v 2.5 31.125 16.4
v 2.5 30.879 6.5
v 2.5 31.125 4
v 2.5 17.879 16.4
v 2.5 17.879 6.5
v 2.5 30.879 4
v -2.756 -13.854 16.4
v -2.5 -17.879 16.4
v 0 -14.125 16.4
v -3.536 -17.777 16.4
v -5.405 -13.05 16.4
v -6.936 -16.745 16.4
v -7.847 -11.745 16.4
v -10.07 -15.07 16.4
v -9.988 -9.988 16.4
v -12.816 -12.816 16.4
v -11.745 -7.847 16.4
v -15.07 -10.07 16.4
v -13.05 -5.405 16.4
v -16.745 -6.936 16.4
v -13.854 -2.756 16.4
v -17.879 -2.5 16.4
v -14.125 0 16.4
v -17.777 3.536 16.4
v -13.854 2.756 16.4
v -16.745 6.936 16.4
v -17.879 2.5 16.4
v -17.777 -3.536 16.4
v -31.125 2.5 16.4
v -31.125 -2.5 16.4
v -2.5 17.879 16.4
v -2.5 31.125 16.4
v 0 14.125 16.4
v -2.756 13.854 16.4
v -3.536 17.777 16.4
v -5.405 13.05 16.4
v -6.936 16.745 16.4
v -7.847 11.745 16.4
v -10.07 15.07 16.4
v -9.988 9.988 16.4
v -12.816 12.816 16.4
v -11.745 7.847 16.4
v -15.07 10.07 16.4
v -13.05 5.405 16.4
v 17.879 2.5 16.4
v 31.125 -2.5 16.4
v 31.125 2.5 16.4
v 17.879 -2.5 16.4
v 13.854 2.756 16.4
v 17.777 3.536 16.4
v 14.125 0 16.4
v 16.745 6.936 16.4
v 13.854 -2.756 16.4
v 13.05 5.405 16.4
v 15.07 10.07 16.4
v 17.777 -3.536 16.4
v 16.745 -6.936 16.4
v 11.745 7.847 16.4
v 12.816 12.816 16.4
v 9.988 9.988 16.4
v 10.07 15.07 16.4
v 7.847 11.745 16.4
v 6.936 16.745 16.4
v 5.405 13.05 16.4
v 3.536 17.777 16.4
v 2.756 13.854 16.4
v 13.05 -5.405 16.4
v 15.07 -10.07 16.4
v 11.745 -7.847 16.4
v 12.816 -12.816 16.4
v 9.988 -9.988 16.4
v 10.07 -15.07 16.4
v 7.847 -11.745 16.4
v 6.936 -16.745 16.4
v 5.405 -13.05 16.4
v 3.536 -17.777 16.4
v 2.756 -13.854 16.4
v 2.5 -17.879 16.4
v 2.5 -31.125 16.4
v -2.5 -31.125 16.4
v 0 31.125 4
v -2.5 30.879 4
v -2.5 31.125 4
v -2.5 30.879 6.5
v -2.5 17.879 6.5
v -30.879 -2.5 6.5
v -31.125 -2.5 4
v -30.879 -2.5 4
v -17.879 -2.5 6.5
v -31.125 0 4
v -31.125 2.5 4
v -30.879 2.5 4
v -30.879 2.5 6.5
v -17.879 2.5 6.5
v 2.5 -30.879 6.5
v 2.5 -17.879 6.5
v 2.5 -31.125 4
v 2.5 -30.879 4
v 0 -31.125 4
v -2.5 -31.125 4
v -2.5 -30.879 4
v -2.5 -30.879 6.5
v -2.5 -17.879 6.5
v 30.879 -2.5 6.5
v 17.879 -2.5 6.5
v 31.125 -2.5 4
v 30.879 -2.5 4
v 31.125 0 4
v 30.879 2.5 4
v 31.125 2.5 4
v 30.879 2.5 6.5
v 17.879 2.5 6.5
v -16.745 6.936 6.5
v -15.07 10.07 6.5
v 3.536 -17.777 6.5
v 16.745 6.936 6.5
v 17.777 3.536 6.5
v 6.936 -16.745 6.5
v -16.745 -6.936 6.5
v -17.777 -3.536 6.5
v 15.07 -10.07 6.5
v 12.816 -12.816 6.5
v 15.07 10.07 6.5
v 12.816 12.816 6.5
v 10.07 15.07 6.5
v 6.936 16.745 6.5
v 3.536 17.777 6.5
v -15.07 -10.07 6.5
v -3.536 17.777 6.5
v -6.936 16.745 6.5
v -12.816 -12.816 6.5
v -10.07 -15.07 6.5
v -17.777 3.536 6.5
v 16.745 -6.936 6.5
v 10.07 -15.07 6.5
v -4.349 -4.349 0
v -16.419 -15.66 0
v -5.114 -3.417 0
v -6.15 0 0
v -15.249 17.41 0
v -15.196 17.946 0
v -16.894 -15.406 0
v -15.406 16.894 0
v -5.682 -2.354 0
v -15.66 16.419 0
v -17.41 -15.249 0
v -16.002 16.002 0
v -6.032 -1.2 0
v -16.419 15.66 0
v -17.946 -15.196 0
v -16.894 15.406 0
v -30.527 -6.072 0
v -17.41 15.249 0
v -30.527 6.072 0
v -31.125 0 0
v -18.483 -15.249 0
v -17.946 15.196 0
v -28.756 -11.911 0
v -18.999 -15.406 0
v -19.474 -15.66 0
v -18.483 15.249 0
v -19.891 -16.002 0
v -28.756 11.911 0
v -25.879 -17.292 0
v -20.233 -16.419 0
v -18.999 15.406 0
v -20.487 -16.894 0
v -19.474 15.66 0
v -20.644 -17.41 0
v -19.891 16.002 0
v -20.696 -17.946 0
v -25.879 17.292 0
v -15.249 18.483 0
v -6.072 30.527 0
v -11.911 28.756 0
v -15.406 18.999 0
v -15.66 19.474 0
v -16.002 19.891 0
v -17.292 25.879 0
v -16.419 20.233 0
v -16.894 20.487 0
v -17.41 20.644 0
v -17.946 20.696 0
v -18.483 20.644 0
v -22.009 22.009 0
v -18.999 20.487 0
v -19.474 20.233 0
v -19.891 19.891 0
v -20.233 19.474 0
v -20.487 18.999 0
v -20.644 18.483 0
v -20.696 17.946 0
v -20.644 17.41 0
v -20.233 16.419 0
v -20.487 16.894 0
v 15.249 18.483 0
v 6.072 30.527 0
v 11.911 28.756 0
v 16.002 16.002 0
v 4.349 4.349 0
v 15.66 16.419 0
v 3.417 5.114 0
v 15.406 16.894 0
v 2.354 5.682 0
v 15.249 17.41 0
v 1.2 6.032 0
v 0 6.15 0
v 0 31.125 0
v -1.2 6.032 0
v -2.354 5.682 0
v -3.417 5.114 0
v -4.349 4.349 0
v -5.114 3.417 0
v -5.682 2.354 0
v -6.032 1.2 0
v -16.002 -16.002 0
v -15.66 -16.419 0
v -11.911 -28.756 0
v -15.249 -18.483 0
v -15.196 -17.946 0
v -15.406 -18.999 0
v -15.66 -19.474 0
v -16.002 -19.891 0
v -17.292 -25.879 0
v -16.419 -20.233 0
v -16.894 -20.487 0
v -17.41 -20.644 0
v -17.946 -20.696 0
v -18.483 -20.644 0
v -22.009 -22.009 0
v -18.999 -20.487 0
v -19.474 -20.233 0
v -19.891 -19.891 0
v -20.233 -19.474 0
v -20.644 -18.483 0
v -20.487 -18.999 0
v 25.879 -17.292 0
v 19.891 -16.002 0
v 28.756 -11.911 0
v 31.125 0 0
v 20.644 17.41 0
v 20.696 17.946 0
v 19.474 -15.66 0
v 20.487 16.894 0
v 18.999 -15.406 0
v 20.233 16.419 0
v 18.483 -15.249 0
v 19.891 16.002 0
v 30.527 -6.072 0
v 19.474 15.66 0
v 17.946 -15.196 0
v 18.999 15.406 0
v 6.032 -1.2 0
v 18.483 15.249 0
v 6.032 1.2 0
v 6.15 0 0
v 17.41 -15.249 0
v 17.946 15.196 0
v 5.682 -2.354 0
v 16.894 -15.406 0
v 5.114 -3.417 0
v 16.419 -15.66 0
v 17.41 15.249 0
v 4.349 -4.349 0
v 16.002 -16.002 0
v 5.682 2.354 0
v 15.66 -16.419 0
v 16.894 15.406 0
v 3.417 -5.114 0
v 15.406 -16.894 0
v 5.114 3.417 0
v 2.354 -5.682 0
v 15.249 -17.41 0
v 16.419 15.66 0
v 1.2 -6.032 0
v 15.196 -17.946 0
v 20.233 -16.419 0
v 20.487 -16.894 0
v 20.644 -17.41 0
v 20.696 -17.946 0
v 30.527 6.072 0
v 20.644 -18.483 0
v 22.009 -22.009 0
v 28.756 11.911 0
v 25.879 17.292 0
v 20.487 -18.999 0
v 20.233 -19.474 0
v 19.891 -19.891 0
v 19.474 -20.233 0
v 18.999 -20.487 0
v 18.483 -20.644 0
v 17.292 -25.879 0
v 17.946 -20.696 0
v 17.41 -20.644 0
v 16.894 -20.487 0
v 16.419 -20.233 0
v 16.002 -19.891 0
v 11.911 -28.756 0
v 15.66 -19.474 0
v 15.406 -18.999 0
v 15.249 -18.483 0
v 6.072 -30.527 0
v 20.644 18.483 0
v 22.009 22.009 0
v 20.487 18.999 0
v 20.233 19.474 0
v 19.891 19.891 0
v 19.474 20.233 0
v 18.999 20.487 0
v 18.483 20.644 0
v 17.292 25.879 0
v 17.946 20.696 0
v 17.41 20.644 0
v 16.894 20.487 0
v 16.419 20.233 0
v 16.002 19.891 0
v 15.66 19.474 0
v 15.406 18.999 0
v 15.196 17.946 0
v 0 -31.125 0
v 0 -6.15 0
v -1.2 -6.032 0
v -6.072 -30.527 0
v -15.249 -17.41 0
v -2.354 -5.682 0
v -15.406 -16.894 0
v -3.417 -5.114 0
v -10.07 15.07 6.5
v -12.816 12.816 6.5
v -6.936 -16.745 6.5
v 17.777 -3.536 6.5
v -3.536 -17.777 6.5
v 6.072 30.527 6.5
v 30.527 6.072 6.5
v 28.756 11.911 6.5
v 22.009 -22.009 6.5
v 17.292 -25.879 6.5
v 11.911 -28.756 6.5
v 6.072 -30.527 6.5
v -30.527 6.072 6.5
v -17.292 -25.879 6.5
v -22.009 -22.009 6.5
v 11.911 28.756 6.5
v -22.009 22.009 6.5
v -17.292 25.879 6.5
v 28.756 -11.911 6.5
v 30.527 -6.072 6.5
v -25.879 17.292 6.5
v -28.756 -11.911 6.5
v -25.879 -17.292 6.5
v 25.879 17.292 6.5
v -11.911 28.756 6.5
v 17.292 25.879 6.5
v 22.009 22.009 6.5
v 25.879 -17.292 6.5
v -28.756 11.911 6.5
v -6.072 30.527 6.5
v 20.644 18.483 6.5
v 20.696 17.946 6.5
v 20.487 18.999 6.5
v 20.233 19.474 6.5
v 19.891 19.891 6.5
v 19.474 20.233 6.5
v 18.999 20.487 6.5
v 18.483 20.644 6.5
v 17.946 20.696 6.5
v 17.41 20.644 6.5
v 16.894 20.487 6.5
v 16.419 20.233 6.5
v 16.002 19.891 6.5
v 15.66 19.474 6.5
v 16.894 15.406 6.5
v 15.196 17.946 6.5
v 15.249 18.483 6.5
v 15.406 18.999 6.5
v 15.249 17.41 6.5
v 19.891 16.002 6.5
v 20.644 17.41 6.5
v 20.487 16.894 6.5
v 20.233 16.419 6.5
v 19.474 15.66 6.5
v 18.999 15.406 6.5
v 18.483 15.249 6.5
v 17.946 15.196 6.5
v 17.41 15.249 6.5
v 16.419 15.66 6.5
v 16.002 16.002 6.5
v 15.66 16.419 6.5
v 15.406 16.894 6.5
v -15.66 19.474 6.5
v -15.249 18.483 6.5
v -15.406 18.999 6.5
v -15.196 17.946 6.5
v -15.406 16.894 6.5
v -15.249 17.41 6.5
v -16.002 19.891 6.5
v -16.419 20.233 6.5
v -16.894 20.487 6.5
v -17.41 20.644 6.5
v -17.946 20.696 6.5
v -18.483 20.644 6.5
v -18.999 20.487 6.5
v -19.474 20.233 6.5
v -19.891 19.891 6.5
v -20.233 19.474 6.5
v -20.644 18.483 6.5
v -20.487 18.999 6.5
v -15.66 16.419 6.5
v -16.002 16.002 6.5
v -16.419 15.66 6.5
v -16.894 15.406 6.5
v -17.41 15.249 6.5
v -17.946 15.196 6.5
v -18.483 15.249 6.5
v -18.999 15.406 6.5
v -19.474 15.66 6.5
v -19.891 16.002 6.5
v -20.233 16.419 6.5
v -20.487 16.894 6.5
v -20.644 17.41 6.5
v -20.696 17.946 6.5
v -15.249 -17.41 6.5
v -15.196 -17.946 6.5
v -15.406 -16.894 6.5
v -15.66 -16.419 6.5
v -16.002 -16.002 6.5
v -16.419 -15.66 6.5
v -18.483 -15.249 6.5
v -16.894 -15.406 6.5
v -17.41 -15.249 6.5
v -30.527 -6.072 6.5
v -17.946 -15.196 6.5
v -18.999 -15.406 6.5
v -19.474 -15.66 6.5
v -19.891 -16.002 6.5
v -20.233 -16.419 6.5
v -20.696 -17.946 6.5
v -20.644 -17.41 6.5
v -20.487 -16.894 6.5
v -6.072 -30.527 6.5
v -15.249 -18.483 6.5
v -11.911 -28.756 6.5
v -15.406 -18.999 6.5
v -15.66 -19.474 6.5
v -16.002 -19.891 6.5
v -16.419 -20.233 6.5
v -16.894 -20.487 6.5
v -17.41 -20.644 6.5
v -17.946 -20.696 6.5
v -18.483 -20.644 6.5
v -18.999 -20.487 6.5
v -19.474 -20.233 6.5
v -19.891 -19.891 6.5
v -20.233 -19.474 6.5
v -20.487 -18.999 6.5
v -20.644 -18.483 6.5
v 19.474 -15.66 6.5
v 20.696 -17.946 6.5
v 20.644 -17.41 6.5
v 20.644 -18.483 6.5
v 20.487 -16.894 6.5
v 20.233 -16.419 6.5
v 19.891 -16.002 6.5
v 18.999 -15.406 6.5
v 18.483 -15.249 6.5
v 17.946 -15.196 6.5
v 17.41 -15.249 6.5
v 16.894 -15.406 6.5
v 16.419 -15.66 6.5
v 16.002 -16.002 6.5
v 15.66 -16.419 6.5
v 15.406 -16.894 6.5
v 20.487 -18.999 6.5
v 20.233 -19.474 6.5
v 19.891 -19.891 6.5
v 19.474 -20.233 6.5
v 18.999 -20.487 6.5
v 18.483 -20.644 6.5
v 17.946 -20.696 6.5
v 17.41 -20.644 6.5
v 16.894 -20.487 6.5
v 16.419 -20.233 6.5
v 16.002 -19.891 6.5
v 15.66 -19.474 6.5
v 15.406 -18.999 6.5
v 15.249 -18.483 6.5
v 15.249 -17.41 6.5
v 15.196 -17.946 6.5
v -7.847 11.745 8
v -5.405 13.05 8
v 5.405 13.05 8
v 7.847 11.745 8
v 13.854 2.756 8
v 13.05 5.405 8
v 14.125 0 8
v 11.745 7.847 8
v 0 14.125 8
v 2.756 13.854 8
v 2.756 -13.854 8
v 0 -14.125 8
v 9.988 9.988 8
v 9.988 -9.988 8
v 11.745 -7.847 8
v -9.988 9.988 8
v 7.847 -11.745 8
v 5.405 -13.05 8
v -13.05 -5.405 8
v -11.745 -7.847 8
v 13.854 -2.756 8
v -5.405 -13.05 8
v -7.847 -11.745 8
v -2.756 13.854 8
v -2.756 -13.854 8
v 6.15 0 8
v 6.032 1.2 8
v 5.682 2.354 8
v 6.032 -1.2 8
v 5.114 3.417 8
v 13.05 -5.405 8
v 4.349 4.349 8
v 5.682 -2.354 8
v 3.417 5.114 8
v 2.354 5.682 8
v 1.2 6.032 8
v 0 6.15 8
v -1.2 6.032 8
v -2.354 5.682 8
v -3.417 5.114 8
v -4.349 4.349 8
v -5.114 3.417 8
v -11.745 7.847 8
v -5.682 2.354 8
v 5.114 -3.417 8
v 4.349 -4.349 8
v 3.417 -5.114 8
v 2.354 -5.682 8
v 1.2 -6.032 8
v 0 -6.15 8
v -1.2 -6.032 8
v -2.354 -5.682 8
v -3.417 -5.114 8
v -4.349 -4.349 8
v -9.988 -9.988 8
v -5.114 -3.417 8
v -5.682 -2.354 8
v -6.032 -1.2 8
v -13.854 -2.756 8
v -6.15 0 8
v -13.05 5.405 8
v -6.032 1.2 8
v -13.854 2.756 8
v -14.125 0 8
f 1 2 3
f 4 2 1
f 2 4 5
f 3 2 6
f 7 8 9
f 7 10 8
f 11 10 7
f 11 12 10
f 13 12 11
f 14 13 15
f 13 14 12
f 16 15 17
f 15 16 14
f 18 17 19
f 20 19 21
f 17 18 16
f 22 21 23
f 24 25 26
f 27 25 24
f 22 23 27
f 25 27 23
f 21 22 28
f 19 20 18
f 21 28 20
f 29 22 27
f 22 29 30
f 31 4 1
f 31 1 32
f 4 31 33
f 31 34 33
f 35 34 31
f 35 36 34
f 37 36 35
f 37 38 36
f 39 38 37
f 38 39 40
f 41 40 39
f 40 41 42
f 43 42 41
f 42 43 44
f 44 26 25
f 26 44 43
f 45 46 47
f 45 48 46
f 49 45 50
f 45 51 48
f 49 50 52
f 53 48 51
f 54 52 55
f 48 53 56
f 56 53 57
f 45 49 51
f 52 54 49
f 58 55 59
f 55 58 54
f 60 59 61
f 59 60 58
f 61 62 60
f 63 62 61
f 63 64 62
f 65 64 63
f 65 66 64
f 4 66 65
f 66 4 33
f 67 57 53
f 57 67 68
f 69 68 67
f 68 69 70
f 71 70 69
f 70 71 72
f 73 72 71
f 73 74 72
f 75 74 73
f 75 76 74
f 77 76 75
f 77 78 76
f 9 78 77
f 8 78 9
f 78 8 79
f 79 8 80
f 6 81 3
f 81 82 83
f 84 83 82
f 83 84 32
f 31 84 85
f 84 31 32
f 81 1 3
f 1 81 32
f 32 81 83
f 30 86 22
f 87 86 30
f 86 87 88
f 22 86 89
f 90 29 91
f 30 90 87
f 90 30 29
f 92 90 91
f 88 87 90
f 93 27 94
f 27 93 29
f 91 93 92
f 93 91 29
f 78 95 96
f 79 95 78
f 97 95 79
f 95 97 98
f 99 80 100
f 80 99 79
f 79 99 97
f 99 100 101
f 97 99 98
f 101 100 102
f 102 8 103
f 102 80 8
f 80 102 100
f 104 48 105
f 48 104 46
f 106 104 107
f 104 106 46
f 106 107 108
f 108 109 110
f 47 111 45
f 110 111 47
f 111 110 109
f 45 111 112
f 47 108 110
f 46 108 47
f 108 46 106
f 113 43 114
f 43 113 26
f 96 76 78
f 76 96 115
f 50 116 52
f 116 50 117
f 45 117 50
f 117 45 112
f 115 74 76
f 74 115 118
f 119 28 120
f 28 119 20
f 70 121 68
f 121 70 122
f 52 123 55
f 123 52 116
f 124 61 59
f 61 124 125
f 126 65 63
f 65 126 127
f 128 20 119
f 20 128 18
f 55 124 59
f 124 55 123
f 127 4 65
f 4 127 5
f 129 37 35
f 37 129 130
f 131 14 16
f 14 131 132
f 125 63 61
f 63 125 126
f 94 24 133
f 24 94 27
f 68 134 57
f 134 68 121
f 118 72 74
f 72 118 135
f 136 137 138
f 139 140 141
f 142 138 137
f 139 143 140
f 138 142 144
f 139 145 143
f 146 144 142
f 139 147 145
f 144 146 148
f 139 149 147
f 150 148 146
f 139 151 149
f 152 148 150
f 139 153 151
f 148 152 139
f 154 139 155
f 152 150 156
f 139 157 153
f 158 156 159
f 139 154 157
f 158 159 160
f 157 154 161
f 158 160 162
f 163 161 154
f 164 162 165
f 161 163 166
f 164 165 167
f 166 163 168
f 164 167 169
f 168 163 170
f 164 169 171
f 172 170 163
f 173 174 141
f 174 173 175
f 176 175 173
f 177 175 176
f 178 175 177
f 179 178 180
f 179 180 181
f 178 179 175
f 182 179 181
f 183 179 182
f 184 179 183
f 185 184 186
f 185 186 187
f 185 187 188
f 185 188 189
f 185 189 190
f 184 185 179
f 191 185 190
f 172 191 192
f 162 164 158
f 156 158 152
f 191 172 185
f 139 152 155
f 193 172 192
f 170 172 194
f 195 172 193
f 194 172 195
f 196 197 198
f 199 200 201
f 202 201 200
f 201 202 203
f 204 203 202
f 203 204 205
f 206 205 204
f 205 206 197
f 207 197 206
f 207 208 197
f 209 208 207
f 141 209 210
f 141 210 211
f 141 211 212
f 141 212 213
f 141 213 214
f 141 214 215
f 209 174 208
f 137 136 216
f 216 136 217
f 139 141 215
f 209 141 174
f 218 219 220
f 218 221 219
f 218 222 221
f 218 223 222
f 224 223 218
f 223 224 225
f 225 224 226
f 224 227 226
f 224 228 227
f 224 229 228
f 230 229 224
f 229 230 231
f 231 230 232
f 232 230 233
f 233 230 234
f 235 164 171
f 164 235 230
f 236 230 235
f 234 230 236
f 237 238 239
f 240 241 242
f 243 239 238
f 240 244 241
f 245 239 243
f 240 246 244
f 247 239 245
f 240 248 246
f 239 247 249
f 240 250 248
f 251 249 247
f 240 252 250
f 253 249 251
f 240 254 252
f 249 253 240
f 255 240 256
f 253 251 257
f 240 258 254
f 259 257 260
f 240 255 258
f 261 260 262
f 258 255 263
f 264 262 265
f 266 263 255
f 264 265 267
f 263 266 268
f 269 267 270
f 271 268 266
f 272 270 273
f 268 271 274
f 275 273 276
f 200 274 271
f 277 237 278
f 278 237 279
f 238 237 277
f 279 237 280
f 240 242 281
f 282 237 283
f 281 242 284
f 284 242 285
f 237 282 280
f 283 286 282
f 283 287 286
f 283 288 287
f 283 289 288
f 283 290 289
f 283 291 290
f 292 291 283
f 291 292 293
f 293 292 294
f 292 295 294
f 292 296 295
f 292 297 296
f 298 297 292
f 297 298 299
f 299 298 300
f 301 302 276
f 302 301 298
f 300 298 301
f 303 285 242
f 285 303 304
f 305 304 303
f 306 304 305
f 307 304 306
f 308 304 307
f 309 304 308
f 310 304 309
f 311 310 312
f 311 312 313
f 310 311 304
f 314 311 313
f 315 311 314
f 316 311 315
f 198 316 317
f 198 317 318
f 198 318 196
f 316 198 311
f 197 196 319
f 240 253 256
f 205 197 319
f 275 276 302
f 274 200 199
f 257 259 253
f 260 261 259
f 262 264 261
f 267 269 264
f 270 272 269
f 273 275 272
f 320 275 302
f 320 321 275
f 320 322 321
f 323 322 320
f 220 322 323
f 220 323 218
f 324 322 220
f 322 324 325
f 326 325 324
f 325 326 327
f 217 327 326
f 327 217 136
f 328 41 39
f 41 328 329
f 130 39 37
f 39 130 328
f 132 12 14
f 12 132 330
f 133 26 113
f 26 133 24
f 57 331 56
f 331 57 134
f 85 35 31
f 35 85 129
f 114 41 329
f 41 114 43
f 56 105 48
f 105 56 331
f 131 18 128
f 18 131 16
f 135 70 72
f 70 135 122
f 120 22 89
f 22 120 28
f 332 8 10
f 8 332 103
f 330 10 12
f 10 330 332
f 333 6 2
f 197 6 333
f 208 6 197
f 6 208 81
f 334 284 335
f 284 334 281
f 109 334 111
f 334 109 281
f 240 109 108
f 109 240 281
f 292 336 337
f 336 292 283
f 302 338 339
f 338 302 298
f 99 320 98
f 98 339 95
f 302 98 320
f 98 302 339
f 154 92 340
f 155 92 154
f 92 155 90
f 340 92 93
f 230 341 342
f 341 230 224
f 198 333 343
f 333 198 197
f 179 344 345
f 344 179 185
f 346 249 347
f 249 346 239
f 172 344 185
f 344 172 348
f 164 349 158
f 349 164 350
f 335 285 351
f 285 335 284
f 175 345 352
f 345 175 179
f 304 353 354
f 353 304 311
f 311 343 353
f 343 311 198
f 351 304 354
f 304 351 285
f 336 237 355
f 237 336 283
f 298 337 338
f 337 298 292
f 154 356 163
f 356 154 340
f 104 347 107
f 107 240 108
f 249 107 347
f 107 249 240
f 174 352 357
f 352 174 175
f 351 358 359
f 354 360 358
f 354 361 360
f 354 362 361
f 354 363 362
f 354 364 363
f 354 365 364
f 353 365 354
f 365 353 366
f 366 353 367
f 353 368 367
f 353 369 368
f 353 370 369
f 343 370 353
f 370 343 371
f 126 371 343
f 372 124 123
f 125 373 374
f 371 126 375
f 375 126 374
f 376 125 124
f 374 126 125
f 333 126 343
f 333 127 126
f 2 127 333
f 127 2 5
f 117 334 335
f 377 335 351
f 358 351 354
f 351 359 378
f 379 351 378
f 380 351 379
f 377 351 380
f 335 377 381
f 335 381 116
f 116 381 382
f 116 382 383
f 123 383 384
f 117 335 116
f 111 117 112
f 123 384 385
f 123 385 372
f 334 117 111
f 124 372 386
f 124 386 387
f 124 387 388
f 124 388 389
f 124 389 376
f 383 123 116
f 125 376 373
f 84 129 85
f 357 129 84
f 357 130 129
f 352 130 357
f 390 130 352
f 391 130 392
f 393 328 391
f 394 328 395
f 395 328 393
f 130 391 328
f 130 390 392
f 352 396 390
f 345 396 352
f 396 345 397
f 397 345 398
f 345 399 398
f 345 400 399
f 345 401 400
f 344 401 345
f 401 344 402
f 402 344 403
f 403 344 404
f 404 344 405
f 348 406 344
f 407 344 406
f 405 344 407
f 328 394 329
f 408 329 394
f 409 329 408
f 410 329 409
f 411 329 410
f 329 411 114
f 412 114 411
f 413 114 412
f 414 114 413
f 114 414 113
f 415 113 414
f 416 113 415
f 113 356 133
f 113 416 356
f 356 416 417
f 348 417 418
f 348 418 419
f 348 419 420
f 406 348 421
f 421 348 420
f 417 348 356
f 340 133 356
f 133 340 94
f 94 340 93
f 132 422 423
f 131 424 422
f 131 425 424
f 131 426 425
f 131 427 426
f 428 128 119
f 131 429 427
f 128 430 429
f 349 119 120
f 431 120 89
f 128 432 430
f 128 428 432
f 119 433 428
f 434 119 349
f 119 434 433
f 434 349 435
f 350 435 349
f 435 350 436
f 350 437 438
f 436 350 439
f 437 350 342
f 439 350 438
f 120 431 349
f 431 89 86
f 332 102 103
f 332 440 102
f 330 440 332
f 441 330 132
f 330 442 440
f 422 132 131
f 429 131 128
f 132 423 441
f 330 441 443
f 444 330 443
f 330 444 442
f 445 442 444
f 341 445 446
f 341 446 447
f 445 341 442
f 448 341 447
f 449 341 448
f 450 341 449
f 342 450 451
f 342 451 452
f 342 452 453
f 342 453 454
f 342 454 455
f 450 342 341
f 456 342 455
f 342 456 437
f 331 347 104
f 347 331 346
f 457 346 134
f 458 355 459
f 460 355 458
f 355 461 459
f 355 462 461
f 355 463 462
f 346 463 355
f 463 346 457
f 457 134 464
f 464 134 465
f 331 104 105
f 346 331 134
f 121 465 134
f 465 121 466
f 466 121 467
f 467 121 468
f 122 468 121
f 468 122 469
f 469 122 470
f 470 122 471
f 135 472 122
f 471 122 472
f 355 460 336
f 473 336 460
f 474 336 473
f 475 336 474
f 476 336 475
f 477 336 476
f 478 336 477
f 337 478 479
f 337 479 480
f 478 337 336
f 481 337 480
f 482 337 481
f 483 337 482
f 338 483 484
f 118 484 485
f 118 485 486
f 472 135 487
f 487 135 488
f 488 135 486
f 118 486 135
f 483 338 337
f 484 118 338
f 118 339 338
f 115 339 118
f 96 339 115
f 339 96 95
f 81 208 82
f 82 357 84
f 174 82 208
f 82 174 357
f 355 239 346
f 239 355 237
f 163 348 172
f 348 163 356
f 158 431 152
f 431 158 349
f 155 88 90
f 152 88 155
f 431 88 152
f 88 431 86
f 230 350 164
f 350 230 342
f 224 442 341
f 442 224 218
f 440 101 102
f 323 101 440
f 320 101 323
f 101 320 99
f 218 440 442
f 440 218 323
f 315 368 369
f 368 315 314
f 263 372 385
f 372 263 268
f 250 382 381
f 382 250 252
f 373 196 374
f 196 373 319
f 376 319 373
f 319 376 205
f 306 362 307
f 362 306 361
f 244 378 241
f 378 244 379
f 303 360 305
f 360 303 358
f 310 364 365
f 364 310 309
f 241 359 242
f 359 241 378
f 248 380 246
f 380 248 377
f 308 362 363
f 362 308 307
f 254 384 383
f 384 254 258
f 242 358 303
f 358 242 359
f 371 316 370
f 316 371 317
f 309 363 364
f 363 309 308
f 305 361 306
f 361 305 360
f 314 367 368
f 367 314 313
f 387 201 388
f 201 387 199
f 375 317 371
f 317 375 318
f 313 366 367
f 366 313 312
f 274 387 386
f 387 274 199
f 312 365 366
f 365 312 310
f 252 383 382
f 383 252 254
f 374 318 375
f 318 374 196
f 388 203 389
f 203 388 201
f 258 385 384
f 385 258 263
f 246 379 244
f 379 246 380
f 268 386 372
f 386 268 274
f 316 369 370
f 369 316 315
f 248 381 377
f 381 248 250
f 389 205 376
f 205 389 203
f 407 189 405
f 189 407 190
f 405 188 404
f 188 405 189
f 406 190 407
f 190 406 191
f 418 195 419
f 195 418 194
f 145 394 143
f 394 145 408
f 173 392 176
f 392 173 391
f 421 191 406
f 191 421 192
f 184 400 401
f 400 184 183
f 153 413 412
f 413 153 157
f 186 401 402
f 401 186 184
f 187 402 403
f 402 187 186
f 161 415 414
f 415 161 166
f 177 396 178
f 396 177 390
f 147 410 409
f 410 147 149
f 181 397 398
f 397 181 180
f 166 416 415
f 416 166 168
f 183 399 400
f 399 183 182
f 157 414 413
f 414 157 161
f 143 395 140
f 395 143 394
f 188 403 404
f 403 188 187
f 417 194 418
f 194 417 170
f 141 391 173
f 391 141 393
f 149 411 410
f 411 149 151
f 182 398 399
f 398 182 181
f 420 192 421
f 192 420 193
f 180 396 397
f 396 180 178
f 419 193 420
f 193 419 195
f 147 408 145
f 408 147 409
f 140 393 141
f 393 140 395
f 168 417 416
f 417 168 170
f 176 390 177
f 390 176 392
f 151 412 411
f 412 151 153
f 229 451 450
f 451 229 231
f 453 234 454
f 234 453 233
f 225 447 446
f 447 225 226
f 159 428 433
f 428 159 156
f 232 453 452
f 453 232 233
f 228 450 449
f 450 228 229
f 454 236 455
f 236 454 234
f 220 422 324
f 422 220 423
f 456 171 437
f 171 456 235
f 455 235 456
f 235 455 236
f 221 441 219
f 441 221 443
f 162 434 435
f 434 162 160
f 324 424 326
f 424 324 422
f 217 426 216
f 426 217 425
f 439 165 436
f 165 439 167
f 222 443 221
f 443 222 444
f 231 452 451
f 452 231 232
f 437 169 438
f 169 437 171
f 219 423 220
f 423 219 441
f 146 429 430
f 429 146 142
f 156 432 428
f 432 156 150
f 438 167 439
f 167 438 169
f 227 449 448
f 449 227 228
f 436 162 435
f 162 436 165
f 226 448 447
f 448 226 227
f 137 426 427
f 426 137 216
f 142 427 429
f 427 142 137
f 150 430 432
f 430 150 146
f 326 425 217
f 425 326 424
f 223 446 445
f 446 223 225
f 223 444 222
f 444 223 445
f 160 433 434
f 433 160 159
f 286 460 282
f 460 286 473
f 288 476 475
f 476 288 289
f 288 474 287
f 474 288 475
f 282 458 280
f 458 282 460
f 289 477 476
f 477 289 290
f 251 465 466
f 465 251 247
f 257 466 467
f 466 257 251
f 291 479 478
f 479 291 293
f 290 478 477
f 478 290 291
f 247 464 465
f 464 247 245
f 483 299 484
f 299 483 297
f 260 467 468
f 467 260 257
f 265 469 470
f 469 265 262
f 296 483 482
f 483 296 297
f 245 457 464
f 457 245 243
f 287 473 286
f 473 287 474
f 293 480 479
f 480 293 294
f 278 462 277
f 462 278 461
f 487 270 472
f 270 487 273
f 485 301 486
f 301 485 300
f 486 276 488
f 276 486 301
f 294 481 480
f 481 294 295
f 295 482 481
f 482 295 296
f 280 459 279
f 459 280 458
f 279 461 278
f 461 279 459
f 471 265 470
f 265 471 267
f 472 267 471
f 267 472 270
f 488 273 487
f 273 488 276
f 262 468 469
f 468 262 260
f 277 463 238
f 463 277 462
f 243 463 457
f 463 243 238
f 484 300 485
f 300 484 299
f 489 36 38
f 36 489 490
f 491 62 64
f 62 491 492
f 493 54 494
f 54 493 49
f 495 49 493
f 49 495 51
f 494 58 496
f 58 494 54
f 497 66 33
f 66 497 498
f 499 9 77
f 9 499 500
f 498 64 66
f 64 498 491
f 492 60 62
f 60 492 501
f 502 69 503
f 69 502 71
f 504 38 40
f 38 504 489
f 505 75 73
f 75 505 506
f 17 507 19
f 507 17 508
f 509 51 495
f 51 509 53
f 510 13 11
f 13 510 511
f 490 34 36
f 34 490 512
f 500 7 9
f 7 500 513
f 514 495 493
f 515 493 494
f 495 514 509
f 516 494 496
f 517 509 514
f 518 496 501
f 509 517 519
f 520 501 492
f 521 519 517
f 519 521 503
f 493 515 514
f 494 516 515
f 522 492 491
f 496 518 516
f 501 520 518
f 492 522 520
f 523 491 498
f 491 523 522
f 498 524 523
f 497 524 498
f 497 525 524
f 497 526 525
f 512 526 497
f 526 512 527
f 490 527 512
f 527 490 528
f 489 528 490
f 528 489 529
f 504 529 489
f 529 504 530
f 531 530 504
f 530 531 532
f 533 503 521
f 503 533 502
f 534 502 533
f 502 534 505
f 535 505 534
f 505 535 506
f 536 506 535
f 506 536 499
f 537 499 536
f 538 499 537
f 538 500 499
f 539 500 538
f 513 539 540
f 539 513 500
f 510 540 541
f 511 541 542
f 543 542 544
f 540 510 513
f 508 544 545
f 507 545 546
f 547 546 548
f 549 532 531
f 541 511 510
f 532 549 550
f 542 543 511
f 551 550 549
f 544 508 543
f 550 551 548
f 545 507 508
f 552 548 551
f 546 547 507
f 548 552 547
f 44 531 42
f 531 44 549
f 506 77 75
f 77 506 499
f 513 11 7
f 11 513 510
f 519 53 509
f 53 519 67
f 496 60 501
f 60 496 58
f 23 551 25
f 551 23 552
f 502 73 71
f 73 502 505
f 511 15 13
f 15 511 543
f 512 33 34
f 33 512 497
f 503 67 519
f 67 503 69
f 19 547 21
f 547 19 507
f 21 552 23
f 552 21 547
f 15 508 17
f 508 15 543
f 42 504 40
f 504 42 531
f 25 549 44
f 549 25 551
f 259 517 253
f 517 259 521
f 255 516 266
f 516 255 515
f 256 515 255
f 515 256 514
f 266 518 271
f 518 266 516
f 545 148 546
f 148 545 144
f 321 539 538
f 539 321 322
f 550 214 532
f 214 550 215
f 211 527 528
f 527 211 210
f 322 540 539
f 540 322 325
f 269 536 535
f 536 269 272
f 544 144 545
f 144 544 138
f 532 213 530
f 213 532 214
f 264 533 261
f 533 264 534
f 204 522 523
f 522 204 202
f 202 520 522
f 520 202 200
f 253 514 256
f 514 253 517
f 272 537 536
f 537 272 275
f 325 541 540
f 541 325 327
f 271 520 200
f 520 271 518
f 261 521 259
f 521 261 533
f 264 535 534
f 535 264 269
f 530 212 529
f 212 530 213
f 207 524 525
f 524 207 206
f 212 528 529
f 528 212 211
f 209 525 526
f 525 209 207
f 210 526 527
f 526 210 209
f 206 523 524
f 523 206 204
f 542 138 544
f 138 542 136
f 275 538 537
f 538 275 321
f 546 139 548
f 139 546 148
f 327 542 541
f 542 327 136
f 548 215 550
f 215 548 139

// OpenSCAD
$fn = 32;

// ----------------------------------------------------------------------
// Bearing housing: seat for 6001 (28 x 8 mm), 36.25 mm body
// ----------------------------------------------------------------------

// --- parameters (mm) ---
housing_d = 36.25;        // housing outside diameter
housing_h = 16.4;         // overall housing height
wall_t = 4;               // wall thickness
seat_d = 28.25;           // 6001 seat, 0.25 mm clearance
seat_h = 8.4;             // pocket depth
shoulder = 3;             // shoulder under the bearing
pass_d = 12.3;            // shaft passage
flange_d = 62.25;         // mounting flange diameter
flange_t = 5;             // flange thickness
bolt_d = 5.5;             // flange bolt clearance
bolt_r = 25.38;           // flange bolt circle radius
rib_w = 5;                // rib width
rib_n = 4;                // rib count

module body() {
  cylinder(h = housing_h, d = housing_d);
}

module flange() {
  /* flange sunk 1.5 mm into the body */
  cylinder(h = flange_t + 1.5, d = flange_d);
}

module ribs() {
  for (i = [0 : rib_n - 1])
    rotate([0, 0, i * 360 / rib_n])
      translate([-rib_w / 2, housing_d / 2 - 0.8, flange_t - 1])
        cube([rib_w, (flange_d - housing_d) / 2 + 0.8, housing_h - flange_t + 1]);
}

difference() {
  union() {
    body();
    flange();
    ribs();
  }
  translate([0, 0, housing_h - seat_h]) cylinder(h = seat_h + 1, d = seat_d);
  translate([0, 0, -1]) cylinder(h = housing_h - seat_h + 1, d = pass_d);
  for (i = [0 : 3]) rotate([0, 0, 45 + i * 90]) translate([bolt_r, 0, -1])
    cylinder(h = flange_t + 3, d = bolt_d);
}
